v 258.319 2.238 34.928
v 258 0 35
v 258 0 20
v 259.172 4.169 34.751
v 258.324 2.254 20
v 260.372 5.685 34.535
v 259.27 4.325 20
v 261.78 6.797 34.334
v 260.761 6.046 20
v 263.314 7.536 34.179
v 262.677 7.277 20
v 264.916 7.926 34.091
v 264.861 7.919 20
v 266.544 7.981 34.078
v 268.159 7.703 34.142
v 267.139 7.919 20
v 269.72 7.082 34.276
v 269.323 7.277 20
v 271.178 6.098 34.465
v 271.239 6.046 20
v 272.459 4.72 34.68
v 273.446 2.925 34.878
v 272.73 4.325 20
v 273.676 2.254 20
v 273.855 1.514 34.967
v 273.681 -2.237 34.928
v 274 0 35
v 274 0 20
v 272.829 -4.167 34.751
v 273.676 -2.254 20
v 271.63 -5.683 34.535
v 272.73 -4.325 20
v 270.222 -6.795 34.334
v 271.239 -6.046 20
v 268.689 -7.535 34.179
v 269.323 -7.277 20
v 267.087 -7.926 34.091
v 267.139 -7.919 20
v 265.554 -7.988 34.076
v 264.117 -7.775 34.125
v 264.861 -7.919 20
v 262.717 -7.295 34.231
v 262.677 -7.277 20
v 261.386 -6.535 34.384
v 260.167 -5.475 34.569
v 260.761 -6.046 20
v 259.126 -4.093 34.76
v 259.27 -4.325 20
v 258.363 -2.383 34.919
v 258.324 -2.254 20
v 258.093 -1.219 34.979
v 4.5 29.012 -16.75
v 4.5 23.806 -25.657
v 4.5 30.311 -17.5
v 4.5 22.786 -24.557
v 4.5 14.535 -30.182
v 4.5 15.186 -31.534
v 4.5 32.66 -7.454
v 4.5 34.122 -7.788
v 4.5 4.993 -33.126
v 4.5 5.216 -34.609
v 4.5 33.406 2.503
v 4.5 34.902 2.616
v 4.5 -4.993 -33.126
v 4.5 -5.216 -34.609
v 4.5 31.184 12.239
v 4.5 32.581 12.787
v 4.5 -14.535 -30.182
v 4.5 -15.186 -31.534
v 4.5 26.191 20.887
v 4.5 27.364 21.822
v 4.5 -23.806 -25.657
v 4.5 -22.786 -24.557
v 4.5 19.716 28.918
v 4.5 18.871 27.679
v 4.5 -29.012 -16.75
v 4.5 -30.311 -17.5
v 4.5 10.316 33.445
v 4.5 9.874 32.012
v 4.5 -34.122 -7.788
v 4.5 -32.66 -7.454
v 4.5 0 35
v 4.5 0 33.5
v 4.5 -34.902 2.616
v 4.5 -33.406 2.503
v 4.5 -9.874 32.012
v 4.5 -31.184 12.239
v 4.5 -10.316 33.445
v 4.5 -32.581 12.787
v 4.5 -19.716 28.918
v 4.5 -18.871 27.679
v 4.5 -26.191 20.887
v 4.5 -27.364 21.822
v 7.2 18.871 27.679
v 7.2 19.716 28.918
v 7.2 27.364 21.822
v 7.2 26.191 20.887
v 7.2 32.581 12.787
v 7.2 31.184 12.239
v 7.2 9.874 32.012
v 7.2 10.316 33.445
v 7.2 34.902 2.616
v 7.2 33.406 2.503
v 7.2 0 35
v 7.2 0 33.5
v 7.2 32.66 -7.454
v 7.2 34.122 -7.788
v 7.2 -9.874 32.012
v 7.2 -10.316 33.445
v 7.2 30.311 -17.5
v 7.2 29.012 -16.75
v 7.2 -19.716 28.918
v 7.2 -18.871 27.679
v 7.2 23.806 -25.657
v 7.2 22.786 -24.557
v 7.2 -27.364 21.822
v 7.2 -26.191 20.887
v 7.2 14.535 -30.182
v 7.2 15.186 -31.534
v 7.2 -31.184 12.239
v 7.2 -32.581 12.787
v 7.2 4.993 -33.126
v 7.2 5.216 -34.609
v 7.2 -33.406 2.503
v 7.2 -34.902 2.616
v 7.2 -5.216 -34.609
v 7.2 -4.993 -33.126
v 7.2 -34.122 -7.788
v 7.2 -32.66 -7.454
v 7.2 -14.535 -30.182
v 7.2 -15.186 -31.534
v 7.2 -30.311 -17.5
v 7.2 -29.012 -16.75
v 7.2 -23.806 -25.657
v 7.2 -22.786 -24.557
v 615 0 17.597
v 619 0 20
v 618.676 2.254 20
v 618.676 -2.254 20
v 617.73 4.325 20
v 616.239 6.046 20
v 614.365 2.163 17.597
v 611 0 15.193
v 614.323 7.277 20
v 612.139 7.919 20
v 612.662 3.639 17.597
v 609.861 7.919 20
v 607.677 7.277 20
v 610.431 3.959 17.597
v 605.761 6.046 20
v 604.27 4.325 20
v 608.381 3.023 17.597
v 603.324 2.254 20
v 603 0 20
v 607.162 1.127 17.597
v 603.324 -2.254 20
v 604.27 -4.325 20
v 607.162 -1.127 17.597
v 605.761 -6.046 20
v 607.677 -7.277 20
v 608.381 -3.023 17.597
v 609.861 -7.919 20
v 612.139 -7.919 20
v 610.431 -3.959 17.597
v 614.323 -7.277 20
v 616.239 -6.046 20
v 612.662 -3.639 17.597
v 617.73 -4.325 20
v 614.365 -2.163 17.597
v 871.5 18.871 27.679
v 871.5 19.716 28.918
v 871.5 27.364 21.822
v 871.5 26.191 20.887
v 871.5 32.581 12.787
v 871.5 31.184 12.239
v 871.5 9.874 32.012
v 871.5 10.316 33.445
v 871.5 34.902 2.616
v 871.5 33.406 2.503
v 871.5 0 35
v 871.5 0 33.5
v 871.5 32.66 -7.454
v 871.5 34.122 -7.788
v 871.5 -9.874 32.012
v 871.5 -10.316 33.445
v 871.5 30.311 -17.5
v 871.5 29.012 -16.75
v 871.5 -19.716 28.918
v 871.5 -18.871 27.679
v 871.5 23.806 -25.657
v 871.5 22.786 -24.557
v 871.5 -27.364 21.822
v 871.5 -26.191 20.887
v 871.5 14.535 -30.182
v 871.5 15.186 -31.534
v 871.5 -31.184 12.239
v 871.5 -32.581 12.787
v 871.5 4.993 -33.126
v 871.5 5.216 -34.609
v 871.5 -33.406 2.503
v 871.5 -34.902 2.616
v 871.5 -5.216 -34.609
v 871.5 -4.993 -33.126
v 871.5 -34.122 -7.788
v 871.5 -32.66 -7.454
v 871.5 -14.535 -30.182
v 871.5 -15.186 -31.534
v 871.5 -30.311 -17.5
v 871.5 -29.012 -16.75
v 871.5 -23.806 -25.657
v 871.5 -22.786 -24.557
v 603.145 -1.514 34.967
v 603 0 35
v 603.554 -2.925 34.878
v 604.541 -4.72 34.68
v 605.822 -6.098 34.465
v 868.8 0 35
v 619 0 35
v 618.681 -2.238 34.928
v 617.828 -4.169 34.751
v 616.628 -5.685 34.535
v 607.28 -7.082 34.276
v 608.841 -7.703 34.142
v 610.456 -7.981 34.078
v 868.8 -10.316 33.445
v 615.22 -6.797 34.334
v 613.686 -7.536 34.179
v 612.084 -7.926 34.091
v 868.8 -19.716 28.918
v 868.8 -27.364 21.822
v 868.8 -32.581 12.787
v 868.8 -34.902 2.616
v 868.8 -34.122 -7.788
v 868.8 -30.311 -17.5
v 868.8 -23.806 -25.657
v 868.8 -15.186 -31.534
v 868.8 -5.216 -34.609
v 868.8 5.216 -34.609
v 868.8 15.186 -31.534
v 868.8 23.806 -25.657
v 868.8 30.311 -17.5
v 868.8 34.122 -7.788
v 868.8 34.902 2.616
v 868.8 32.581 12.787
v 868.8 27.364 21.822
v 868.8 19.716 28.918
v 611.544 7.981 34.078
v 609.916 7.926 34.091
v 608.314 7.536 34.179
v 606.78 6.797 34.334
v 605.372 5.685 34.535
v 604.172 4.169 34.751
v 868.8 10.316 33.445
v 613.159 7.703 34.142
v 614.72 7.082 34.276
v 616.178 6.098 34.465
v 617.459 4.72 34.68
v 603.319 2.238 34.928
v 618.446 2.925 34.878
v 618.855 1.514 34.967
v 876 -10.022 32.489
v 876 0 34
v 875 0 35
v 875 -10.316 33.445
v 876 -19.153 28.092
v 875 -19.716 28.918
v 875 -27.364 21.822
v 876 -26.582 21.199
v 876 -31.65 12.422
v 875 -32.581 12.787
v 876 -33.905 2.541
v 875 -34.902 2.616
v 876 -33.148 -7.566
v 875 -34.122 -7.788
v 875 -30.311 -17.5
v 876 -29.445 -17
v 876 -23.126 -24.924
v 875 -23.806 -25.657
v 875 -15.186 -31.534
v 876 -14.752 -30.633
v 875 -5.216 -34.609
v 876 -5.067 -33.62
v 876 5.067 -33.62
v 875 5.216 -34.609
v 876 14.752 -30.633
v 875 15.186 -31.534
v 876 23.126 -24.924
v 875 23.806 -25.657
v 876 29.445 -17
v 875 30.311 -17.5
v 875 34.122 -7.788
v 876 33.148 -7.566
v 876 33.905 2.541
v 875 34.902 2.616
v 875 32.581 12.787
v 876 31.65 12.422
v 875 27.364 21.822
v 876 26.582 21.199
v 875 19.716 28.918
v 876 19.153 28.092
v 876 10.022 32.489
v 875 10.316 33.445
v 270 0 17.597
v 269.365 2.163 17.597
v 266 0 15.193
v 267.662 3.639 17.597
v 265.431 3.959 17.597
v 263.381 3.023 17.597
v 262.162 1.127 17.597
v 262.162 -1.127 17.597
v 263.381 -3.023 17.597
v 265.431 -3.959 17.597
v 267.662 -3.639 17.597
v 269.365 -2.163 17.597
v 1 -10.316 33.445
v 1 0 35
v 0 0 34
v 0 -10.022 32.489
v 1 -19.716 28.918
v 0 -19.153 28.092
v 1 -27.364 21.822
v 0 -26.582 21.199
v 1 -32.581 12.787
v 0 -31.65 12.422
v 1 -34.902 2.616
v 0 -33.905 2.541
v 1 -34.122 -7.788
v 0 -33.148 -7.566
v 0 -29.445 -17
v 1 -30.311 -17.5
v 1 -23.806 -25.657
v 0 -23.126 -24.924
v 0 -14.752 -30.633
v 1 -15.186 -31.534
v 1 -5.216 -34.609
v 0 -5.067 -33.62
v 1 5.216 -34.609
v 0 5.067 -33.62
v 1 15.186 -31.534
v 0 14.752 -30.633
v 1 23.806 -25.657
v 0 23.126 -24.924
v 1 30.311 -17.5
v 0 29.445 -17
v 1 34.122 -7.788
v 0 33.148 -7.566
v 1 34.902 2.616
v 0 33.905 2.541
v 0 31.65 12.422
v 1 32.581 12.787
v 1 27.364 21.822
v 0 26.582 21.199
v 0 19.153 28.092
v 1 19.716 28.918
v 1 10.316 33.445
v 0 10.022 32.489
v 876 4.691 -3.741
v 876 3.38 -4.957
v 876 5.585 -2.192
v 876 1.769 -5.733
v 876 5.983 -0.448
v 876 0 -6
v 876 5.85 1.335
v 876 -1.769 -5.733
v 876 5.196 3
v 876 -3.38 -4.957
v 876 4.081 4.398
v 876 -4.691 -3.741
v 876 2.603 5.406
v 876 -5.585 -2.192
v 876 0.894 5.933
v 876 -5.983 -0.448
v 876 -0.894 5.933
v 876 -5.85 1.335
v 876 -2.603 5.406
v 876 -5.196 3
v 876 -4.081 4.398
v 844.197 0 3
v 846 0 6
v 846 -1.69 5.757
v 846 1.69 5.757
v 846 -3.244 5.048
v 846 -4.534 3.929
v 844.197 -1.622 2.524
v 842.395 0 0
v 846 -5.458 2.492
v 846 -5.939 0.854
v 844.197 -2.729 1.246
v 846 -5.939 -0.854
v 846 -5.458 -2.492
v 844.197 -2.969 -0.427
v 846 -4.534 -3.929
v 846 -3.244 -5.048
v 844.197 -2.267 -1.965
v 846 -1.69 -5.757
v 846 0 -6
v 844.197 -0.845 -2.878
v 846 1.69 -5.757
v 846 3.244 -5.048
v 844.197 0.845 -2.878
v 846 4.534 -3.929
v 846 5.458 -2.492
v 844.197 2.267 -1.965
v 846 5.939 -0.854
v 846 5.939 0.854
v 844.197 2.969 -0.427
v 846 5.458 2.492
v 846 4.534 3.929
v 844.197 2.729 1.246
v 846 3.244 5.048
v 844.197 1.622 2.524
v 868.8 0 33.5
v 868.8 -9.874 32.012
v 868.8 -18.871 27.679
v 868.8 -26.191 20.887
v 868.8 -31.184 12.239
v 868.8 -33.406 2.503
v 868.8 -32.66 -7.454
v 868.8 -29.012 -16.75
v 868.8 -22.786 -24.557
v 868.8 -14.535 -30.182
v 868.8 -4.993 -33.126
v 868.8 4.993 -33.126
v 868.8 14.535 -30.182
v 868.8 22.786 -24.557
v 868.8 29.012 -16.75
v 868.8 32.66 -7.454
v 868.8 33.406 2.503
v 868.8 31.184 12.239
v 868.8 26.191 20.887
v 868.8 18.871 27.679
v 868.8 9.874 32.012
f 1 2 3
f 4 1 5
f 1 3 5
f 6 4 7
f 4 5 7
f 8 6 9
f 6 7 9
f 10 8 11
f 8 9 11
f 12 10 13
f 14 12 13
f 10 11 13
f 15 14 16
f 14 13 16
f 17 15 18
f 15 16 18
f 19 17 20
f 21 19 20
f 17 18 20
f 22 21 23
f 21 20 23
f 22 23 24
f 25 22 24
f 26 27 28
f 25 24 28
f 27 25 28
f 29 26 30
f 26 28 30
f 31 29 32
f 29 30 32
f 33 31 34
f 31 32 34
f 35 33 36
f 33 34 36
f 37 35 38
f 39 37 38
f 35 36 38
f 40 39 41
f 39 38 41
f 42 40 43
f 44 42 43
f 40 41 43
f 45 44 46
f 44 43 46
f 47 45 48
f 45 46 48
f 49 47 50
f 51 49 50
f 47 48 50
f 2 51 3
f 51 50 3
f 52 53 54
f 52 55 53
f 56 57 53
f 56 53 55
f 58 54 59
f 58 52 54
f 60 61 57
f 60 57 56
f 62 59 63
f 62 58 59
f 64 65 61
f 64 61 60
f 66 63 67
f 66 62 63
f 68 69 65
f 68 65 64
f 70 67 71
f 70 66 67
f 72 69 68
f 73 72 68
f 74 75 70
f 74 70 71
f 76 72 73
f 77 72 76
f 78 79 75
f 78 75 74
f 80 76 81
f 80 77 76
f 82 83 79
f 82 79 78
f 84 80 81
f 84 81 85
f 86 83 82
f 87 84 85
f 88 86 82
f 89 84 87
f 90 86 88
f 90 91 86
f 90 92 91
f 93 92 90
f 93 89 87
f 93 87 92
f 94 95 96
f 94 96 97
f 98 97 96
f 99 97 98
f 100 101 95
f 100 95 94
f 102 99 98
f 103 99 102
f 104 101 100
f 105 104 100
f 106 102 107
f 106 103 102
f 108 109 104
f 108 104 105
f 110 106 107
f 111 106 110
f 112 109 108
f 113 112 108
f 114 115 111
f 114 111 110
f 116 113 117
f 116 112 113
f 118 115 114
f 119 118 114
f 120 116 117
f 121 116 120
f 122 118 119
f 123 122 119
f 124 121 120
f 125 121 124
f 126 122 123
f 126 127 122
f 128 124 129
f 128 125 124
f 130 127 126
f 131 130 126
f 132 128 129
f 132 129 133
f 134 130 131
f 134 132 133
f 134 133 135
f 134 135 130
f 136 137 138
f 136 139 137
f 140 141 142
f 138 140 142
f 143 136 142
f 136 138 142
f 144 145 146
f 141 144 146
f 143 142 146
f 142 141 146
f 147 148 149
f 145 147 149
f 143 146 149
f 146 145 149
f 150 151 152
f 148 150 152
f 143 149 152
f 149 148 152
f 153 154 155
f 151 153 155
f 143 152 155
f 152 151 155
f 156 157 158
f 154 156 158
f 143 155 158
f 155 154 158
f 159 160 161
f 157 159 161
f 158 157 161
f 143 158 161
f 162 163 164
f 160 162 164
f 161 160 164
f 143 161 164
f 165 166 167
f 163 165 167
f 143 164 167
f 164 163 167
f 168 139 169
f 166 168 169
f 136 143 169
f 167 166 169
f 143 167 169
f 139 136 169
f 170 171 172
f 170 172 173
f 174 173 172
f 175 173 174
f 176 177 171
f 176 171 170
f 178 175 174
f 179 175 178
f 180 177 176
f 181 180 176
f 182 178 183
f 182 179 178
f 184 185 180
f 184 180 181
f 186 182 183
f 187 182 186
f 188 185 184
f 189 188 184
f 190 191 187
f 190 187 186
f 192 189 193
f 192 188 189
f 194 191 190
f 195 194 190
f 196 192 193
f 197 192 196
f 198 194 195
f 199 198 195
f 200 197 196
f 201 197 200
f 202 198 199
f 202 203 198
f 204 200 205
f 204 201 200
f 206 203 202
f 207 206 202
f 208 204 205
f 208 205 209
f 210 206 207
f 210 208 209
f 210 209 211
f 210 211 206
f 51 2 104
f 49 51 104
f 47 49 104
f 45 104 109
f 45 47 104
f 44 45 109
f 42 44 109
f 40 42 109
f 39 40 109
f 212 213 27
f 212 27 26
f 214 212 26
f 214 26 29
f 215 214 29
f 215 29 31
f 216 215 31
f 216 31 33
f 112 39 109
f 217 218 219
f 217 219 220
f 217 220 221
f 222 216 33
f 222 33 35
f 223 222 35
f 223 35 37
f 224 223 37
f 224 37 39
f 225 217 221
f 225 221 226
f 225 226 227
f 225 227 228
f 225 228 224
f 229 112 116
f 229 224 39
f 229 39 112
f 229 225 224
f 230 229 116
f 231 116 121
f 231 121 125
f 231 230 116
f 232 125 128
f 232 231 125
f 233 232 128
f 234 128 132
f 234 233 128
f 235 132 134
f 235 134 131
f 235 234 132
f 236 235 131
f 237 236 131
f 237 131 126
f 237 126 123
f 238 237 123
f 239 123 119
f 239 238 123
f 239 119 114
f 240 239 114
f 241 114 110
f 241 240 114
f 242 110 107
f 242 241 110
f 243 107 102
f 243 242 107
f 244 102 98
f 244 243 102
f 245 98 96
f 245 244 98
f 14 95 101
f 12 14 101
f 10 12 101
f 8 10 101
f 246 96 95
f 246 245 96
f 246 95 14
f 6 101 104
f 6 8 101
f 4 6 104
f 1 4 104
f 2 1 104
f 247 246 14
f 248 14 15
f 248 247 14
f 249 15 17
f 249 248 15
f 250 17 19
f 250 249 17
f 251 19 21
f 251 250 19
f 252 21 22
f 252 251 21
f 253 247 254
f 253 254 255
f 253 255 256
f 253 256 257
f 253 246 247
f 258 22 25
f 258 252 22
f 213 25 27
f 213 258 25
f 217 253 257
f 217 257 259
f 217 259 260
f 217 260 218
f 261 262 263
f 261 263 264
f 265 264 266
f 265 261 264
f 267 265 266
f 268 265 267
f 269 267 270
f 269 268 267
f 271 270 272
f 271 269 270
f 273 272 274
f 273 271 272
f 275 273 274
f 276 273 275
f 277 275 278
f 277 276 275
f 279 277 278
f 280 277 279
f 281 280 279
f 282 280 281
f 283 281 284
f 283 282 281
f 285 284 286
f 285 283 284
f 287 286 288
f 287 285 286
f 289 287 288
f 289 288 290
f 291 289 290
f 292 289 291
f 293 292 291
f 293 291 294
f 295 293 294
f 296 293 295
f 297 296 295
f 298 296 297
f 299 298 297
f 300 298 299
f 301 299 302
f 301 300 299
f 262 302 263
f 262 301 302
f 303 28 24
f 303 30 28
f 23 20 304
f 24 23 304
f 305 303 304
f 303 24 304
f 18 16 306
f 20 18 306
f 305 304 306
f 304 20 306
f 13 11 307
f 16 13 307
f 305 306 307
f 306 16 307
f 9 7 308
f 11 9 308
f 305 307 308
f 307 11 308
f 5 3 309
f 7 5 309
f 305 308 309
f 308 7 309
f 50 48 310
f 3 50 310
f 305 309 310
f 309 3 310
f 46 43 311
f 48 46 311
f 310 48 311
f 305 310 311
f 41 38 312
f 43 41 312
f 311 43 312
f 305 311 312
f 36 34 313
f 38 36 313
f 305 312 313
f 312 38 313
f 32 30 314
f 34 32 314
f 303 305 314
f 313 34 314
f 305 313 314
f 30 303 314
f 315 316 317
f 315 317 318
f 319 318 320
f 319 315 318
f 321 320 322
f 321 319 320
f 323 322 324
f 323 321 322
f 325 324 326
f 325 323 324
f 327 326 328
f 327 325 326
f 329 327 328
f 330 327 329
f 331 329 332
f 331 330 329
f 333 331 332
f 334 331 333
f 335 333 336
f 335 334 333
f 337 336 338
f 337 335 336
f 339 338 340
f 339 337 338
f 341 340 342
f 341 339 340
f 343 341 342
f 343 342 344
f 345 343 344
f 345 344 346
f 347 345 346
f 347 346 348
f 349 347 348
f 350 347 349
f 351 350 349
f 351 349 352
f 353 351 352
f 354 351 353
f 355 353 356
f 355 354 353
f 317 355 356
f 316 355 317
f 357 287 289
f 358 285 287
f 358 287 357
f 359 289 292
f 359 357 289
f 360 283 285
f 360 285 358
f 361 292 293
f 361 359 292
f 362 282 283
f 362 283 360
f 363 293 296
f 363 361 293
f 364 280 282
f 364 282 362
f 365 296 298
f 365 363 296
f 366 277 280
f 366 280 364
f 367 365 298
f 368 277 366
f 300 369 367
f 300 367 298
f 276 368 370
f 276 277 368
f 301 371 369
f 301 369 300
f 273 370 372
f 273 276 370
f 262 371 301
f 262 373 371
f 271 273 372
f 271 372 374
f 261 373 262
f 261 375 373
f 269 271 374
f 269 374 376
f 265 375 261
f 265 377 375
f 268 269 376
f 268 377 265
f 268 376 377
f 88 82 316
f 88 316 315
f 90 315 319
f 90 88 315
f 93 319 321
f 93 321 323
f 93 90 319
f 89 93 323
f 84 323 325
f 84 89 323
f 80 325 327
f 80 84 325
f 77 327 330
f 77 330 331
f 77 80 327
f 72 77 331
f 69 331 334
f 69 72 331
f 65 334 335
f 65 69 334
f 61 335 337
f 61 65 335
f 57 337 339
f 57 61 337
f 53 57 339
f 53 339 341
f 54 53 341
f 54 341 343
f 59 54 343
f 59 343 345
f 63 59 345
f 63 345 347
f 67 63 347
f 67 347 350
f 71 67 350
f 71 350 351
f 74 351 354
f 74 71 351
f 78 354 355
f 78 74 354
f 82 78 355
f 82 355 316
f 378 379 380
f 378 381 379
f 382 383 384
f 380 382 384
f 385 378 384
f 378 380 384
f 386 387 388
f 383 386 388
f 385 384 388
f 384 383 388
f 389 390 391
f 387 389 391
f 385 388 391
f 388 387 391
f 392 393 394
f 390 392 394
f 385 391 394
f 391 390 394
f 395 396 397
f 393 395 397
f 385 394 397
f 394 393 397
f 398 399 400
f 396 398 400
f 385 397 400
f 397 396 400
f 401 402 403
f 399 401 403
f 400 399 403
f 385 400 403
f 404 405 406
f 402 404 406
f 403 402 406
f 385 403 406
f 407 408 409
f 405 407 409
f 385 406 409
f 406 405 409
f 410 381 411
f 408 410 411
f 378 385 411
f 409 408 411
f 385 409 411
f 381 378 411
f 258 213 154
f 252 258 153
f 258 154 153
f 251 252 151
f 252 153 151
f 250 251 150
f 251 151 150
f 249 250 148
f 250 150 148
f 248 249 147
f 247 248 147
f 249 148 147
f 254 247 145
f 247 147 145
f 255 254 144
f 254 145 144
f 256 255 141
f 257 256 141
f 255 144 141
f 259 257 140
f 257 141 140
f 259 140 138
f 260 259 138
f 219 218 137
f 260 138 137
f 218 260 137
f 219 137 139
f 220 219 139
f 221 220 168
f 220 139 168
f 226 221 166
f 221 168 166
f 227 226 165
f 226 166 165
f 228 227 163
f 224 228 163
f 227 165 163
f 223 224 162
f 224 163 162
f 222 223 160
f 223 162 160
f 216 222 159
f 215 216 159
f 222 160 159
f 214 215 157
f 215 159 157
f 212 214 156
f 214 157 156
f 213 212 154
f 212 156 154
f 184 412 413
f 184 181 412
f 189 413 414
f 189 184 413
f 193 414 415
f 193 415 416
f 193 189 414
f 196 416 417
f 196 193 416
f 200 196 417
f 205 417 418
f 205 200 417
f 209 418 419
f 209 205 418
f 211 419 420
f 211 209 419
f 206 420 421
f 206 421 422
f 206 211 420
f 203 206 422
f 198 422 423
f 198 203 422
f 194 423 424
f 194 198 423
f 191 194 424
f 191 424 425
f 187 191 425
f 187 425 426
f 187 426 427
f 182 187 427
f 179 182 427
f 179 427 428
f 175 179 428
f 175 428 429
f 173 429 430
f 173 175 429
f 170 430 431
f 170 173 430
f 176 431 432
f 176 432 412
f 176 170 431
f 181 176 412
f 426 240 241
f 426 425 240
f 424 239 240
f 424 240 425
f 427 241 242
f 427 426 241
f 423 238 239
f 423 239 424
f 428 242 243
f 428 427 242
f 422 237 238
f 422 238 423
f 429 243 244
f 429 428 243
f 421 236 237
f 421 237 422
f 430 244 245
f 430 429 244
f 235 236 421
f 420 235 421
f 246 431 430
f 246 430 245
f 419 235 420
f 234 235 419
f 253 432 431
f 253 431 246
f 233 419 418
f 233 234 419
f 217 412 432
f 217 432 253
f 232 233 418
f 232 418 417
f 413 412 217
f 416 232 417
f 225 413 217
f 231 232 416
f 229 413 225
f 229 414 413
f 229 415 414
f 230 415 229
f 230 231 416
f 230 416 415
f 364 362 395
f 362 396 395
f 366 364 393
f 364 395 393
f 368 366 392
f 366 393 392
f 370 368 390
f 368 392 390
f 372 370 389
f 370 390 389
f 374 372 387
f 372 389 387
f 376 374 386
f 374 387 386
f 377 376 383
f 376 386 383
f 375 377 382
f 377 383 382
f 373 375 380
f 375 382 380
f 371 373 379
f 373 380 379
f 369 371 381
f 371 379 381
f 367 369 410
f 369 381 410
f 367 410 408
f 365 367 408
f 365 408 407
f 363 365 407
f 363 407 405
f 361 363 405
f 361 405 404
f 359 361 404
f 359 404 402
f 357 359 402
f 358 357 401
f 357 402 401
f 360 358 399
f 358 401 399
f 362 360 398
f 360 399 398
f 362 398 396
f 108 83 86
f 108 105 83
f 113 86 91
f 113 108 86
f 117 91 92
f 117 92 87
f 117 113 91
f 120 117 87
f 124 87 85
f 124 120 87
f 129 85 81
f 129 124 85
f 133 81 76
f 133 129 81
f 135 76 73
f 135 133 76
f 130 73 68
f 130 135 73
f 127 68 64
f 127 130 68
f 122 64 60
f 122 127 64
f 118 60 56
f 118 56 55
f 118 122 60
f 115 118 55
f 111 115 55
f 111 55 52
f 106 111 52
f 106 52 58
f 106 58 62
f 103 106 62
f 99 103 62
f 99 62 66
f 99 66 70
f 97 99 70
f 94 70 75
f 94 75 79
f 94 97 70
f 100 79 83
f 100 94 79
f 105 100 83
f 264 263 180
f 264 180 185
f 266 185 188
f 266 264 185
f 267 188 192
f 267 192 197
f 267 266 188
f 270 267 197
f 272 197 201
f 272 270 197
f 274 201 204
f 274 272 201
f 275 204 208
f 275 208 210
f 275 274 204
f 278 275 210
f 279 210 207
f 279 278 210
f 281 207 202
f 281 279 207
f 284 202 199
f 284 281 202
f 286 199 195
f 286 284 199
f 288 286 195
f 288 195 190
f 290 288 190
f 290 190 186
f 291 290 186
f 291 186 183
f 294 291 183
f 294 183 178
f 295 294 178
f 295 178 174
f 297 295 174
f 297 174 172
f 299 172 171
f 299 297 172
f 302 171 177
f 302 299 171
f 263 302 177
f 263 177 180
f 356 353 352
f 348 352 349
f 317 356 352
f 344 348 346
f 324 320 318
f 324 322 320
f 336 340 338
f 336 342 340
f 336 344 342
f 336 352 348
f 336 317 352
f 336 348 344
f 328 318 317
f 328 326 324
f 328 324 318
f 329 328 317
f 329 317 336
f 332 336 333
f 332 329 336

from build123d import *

# Parameters (mm, degrees)
HOLE_WIZARD_16_0_16_2_D     = 16
HOLE_WIZARD_16_0_16_2_DEPTH = 15
HOLE_WIZARD_16_0_16_2_TIP   = 4.806884952
HOLE_WIZARD_M14_1_D         = 12
HOLE_WIZARD_M14_1_DEPTH     = 30
HOLE_WIZARD_M14_1_TIP       = 3.605163714
CHAMFER_1_SIZE              = 1


with BuildPart() as part:
    # 草图1 → 旋转1 (revolve)
    with BuildSketch(Plane.XY, mode=Mode.PRIVATE) as revolve_1_sk:
        Polygon((0, 0), (0, 35), (4.5, 35), (4.5, 33.5), (7.2, 33.5), (7.2, 35), (868.8, 35), (868.8, 33.5), (871.5, 33.5), (871.5, 35), (876, 35), (876, 0), align=None)
    revolve(revolve_1_sk.sketch.rotate(Axis((0, 0, 0), (1, 0, 0)), 90), axis=Axis((0, 0, 0), (1, 0, 0)))

    # Ø16.0 (16) 直径孔2
    with Locations(Plane.XY.offset(35)):
        with Locations((266, 0), (611, 0)):
            Hole(HOLE_WIZARD_16_0_16_2_D / 2, depth=HOLE_WIZARD_16_0_16_2_DEPTH)
            with Locations((0, 0, -(HOLE_WIZARD_16_0_16_2_DEPTH + HOLE_WIZARD_16_0_16_2_TIP / 2))):  # 118° drill point
                Cone(0, HOLE_WIZARD_16_0_16_2_D / 2, HOLE_WIZARD_16_0_16_2_TIP, mode=Mode.SUBTRACT)

    # M14 螺纹孔1
    with Locations(Plane(origin=(876, 0, 0), x_dir=(0, 0, 1), z_dir=(1, 0, 0))):
        with Locations((0, 0)):
            Hole(HOLE_WIZARD_M14_1_D / 2, depth=HOLE_WIZARD_M14_1_DEPTH)
            with Locations((0, 0, -(HOLE_WIZARD_M14_1_DEPTH + HOLE_WIZARD_M14_1_TIP / 2))):  # 118° drill point
                Cone(0, HOLE_WIZARD_M14_1_D / 2, HOLE_WIZARD_M14_1_TIP, mode=Mode.SUBTRACT)

    # 倒角1
    chamfer_1_edges = [part.edges().sort_by_distance(p)[0] for p in [
        (0, 0, -35),
        (876, 0, -35),
    ]]
    chamfer(chamfer_1_edges, length=CHAMFER_1_SIZE)


solid = part.part
